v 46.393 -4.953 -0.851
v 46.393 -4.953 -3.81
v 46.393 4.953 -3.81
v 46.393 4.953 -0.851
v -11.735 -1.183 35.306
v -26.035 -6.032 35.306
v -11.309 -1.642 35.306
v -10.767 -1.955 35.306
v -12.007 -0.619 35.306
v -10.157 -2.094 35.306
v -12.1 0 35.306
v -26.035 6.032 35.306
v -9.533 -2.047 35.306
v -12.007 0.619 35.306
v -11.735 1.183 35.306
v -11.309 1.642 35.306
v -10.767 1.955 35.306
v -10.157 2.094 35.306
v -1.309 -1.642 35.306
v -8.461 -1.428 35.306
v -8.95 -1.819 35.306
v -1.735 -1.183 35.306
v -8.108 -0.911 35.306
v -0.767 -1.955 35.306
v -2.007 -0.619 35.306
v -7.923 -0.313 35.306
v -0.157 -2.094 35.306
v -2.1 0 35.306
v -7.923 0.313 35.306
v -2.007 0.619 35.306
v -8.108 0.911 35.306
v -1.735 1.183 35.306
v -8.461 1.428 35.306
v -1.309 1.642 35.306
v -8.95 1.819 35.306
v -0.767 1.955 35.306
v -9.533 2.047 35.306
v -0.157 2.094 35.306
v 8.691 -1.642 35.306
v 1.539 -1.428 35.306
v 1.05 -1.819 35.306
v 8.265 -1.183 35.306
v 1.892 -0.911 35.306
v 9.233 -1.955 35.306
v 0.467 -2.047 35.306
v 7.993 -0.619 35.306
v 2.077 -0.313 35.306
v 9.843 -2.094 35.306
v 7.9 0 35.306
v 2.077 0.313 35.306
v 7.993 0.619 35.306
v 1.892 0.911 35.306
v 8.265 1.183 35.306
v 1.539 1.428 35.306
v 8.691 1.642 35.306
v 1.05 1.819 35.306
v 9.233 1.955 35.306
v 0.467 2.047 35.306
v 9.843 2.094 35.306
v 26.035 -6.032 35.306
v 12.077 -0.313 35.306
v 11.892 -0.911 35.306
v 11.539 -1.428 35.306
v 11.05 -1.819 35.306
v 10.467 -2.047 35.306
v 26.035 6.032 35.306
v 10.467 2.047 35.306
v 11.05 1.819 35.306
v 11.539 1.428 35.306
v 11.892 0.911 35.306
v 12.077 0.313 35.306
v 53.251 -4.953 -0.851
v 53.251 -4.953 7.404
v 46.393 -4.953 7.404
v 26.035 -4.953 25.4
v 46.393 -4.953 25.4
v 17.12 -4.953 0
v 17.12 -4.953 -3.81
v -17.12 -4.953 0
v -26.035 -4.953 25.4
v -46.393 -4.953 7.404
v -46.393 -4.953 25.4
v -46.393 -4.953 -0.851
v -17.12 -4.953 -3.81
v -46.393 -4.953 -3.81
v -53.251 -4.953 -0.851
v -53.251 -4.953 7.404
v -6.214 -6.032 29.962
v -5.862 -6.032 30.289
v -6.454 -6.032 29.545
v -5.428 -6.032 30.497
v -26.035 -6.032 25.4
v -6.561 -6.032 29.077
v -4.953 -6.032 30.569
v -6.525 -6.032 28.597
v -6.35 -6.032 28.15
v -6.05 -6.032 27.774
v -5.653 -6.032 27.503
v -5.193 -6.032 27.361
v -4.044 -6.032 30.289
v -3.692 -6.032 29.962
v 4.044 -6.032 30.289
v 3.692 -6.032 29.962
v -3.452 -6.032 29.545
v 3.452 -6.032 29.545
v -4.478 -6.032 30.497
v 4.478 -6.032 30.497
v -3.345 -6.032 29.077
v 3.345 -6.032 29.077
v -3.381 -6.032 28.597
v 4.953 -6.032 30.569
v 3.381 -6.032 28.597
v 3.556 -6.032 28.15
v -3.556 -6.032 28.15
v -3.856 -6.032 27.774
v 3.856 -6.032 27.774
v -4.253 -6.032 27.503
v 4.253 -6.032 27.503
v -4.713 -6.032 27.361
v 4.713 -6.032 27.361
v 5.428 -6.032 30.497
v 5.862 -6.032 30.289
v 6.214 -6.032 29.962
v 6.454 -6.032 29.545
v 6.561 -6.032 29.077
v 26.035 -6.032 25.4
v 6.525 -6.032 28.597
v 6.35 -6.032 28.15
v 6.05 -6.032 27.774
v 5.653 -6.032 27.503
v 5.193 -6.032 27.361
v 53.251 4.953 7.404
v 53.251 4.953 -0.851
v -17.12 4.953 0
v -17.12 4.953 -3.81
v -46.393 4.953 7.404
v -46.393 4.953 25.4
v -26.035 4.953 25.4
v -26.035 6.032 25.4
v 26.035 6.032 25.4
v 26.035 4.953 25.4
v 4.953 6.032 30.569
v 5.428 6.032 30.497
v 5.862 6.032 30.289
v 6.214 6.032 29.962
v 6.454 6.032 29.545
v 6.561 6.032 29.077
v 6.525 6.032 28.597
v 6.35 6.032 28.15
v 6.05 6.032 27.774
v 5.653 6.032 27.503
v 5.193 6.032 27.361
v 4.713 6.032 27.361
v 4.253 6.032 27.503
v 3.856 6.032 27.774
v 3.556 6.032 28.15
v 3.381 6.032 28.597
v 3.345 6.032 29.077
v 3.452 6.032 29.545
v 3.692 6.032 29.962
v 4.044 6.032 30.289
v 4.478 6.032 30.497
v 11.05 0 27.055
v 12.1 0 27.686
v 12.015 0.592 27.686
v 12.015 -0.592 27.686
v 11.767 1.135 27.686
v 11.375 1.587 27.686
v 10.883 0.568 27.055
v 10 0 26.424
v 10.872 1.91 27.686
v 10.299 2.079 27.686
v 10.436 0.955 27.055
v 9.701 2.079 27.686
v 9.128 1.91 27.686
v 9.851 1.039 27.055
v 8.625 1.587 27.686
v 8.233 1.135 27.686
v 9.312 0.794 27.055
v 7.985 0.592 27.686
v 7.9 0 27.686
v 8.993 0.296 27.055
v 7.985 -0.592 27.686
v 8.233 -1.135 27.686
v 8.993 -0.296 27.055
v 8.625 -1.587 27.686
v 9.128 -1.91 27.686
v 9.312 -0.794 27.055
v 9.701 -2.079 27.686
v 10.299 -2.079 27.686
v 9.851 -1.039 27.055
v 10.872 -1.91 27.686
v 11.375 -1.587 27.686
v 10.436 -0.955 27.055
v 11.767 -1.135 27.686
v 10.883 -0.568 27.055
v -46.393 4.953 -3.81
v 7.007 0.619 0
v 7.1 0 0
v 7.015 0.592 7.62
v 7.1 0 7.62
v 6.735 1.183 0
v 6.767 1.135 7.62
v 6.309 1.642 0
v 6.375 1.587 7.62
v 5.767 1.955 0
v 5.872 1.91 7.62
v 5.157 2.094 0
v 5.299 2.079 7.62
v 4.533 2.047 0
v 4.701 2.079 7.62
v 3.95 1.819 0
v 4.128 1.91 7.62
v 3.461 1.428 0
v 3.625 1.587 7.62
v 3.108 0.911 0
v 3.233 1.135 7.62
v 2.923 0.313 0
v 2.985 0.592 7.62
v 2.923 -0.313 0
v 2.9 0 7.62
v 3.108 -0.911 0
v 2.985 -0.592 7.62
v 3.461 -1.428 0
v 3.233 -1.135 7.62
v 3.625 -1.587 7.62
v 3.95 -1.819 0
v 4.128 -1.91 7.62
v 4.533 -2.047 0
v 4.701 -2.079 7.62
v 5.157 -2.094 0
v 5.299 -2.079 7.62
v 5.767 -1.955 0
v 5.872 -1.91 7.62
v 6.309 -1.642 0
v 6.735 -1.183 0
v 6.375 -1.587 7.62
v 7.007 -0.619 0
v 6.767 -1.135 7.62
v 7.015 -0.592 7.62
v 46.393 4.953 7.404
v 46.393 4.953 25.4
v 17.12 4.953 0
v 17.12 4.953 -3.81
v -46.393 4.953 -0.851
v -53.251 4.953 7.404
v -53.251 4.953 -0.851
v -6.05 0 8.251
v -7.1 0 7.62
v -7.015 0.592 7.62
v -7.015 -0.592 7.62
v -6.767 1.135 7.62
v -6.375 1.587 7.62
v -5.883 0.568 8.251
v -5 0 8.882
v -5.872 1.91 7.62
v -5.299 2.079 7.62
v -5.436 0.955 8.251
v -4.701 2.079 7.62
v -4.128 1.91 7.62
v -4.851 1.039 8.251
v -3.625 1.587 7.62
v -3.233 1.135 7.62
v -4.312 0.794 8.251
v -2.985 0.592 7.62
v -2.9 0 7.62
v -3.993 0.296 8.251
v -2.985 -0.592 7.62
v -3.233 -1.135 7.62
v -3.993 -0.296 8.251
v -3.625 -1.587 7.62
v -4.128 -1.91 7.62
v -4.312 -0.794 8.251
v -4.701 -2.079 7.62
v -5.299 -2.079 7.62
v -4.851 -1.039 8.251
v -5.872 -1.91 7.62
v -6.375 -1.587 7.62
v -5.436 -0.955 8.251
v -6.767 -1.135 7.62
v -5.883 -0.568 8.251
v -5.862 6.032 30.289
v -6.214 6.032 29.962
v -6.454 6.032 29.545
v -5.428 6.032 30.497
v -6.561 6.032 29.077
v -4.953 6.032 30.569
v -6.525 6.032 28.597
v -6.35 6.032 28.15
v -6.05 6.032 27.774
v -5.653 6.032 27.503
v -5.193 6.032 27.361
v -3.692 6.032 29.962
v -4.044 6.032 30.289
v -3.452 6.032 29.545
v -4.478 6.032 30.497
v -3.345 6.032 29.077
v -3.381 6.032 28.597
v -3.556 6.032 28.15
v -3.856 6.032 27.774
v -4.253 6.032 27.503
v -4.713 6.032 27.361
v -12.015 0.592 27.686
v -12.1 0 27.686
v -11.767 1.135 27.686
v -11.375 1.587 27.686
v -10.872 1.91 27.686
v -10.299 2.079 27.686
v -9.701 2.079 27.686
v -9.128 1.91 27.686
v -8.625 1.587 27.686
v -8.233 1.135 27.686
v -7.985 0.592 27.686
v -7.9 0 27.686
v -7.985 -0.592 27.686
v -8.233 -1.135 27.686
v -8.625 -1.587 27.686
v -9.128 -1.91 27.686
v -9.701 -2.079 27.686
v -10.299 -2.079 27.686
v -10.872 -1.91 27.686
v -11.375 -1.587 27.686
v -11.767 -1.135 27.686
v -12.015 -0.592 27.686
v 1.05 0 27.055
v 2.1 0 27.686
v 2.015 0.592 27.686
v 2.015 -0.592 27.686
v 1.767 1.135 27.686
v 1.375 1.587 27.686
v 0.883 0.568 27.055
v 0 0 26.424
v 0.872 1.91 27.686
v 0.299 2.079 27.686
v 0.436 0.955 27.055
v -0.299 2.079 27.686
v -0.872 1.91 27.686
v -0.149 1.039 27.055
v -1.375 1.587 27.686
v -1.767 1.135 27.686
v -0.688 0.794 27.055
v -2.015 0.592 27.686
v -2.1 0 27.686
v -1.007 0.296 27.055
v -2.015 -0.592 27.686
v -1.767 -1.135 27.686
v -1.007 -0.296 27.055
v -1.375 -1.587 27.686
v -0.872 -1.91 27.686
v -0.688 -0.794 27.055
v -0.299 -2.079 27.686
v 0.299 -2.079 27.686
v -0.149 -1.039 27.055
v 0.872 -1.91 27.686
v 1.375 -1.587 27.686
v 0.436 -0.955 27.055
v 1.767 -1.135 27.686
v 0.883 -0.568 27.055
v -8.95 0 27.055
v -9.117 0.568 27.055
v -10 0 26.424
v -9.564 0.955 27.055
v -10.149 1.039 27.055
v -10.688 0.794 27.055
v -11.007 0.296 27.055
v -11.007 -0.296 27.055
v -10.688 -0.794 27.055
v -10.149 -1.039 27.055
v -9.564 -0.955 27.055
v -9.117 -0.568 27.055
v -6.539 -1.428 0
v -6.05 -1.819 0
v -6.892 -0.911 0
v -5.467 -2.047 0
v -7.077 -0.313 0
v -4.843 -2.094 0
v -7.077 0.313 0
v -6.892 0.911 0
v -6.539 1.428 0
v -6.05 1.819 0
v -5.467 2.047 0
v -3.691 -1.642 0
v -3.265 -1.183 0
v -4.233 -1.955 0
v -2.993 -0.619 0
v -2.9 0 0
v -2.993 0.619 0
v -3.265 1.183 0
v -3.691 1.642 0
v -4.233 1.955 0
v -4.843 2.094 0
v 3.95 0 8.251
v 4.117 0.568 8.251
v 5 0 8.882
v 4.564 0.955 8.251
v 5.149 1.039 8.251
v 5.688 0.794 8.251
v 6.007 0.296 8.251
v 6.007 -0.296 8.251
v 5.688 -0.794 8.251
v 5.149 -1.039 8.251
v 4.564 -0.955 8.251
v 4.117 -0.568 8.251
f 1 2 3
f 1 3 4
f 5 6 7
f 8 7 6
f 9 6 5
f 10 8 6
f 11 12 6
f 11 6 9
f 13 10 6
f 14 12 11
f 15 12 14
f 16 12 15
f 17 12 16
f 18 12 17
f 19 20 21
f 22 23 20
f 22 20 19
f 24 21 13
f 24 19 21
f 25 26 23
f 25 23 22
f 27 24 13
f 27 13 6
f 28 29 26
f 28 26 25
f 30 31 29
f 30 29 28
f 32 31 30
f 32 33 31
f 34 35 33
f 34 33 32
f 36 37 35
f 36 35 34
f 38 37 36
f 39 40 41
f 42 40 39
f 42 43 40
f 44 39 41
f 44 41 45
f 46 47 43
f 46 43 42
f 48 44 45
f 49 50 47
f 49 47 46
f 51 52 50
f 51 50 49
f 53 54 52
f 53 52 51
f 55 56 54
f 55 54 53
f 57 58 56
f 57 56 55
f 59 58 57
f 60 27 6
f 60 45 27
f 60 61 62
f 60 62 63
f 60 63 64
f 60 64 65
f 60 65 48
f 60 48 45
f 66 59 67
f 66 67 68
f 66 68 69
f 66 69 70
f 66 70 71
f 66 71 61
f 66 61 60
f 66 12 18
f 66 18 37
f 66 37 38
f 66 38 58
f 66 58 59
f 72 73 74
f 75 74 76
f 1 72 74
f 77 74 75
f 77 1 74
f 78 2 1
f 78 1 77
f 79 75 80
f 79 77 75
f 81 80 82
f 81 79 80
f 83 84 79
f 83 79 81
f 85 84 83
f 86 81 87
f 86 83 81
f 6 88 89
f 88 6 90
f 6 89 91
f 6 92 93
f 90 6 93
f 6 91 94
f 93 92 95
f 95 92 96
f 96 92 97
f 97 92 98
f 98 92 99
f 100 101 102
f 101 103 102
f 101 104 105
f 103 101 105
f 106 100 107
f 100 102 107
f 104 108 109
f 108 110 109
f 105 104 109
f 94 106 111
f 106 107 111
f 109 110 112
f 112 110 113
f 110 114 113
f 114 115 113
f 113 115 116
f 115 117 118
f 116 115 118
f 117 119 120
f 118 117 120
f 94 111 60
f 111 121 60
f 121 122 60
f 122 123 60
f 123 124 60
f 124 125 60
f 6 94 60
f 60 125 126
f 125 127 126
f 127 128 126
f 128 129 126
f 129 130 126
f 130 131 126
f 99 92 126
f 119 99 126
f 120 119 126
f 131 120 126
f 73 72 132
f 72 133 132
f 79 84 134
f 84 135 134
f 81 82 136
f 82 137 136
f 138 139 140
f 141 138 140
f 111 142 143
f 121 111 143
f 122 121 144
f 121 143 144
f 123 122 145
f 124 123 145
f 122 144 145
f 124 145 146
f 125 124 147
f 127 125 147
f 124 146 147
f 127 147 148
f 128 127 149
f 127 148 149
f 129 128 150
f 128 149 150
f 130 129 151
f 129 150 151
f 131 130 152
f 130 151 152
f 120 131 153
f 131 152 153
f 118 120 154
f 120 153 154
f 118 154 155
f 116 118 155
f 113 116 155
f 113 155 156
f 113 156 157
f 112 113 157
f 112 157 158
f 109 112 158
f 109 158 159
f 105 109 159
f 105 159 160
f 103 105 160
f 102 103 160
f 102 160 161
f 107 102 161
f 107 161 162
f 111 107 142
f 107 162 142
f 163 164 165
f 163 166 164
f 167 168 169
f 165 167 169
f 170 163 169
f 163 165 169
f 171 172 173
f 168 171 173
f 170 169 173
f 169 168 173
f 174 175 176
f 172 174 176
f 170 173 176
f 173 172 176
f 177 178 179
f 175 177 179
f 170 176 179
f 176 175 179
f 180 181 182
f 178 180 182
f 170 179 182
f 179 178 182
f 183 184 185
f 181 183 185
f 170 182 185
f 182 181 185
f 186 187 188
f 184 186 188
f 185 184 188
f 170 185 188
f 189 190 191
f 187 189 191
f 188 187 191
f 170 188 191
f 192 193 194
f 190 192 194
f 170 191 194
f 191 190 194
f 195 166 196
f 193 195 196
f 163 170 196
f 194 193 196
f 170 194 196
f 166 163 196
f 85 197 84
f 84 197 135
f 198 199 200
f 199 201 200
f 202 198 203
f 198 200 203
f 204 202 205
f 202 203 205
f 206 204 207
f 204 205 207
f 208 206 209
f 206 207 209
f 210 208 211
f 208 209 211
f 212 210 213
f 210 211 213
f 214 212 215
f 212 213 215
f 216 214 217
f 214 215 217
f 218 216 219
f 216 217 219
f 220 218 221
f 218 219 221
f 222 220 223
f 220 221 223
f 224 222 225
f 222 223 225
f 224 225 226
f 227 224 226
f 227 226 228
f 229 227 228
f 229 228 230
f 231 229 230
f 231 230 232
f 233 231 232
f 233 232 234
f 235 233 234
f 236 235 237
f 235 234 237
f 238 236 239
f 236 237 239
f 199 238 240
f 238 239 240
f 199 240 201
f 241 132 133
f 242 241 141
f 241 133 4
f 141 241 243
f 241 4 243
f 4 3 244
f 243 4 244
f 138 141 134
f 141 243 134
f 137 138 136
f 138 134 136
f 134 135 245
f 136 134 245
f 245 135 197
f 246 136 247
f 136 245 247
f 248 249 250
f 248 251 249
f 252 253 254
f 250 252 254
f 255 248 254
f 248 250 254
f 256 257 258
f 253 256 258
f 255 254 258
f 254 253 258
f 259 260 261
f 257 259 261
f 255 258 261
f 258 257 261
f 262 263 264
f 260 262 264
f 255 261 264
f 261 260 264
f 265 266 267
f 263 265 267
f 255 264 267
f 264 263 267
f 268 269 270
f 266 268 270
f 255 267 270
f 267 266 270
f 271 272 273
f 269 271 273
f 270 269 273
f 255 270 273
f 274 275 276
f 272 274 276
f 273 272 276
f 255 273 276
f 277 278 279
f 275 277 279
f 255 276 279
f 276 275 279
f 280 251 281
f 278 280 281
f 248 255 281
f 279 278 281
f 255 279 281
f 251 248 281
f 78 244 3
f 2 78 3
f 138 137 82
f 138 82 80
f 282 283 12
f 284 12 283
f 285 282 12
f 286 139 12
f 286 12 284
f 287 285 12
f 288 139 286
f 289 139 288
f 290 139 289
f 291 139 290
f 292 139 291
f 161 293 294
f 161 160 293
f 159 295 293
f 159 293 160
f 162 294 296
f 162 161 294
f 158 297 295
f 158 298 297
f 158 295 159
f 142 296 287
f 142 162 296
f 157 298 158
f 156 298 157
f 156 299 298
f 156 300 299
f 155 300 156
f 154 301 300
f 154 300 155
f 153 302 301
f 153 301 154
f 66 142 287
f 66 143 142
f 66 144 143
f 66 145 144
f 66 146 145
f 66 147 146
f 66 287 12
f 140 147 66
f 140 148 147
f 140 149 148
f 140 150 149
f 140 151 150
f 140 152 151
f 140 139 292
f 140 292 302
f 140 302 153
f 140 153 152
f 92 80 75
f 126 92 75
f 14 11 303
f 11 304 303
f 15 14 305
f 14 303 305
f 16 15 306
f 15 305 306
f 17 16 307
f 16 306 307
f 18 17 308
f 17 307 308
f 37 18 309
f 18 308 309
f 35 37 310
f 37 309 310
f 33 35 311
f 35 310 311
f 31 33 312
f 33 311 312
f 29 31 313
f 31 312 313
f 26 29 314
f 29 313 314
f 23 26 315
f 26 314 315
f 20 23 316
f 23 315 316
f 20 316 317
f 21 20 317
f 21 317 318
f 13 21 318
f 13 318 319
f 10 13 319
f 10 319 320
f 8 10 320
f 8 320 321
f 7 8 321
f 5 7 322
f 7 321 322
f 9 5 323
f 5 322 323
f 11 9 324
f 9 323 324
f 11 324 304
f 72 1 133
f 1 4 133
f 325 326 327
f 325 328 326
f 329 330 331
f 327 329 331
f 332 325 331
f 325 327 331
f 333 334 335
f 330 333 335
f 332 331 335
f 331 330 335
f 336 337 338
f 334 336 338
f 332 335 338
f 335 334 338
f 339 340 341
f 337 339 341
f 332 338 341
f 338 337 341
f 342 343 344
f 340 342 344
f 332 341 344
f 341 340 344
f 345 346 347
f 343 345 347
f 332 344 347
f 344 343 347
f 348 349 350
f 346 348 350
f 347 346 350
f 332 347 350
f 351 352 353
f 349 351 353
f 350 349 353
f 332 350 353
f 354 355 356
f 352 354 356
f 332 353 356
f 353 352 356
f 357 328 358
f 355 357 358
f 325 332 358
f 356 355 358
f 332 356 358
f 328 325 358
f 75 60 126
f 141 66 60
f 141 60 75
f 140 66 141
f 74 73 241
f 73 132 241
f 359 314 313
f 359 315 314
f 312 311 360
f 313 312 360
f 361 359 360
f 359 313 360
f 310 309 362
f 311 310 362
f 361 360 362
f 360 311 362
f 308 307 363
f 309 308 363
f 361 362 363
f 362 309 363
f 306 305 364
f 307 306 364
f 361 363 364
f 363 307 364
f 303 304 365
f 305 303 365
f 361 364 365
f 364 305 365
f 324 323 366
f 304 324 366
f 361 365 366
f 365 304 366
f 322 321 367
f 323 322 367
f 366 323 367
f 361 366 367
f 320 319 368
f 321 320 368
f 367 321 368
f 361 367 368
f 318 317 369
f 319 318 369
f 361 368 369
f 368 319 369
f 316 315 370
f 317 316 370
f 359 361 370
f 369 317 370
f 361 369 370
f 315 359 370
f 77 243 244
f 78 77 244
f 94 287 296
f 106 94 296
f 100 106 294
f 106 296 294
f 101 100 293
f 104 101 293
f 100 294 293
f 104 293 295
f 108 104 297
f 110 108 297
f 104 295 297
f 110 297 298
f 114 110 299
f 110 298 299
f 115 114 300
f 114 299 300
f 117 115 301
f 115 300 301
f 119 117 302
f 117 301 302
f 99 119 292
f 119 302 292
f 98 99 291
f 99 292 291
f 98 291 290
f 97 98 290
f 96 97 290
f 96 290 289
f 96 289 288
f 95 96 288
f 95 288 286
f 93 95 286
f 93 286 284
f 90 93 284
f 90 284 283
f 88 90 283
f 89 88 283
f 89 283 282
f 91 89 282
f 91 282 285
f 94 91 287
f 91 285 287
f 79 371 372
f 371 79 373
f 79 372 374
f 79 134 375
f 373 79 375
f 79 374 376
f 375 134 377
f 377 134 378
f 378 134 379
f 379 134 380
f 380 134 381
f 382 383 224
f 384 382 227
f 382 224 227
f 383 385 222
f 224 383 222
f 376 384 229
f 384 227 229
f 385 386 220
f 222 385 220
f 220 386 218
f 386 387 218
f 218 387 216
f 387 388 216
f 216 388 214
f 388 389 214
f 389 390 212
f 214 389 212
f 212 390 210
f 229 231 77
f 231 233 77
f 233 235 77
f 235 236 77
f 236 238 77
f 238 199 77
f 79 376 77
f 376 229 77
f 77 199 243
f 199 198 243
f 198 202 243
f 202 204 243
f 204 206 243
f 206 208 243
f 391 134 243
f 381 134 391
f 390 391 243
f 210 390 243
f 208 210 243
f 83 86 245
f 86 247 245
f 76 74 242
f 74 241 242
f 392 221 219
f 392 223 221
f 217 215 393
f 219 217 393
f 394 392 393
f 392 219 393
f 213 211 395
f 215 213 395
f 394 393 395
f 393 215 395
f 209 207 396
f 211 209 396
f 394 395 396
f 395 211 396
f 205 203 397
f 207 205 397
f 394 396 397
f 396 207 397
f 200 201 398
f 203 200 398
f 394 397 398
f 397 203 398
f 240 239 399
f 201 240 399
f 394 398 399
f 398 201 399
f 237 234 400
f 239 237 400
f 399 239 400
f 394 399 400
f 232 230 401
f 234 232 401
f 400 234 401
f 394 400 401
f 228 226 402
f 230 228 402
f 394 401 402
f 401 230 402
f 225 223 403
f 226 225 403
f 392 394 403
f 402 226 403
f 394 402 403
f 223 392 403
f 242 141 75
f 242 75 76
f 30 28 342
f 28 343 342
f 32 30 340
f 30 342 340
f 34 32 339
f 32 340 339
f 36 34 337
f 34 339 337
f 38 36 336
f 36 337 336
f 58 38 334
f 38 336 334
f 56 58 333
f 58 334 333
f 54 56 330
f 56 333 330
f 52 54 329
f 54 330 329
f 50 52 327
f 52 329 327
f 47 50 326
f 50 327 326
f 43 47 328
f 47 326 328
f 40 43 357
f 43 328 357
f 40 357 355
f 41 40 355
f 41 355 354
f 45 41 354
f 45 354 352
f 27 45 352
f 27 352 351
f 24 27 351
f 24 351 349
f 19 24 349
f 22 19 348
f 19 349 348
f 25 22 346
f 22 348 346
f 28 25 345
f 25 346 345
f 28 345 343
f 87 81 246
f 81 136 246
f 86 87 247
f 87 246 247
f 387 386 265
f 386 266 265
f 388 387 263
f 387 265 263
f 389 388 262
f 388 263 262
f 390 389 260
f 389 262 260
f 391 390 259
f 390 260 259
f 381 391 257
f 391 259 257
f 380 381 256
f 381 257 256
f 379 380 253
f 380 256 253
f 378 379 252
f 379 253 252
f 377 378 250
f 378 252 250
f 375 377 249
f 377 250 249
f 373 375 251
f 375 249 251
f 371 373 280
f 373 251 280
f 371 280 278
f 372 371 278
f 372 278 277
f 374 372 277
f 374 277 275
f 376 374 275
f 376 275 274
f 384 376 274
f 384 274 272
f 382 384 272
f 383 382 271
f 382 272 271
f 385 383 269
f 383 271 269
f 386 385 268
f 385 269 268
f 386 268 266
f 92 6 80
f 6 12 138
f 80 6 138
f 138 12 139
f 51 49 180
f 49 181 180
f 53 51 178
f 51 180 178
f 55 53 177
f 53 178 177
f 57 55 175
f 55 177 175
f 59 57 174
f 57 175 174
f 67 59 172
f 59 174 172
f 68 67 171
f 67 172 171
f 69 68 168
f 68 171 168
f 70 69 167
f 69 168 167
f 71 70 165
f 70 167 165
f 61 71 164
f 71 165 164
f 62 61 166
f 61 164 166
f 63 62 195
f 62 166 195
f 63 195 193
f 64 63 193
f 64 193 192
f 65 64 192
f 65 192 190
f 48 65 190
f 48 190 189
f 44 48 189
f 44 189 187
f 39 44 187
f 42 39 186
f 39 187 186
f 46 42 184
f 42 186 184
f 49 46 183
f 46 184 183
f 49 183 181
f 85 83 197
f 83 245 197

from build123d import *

# Parameters (mm, degrees)
BOSS_EXTRUDE1_DEPTH                 = 4.953
SKETCH4_W                           = 52.07
SKETCH4_H                           = 9.906
BOSS_EXTRUDE3_DEPTH                 = 6.0325
SKETCH5_R                           = 1.6129
CUT_EXTRUDE1_DEPTH                  = 12.065
M5X0_8_TAPPED_HOLE1_D               = 4.2
M5X0_8_TAPPED_HOLE1_DEPTH           = 7.62
M5X0_8_TAPPED_HOLE1_TIP             = 1.2618073
M5X0_8_TAPPED_HOLE1_ON_FACE_2_D     = 4.2
M5X0_8_TAPPED_HOLE1_ON_FACE_2_DEPTH = 7.62
M5X0_8_TAPPED_HOLE1_ON_FACE_2_TIP   = 1.2618073


with BuildPart() as part:
    # Sketch1 → Boss-Extrude1 (new, symmetric)
    with BuildSketch(Plane(origin=(0, 0, 0), x_dir=(1, 0, 0), z_dir=(0, 1, 0))):
        Polygon((17.1196, 3.81), (46.3931, 3.81), (46.3931, 0.8509), (53.2511, 0.8509), (53.2511, -7.4041), (46.3931, -7.4041), (46.3931, -25.4), (26.035, -25.4), (-26.035, -25.4), (-46.3931, -25.4), (-46.3931, -7.4041), (-53.2511, -7.4041), (-53.2511, 0.8509), (-46.3931, 0.8509), (-46.3931, 3.81), (-17.1196, 3.81), (-17.1196, 0), (17.1196, 0), align=None)
    extrude(amount=BOSS_EXTRUDE1_DEPTH, both=True)

    # Sketch4 → Boss-Extrude3 (add, symmetric)
    with BuildSketch(Plane(origin=(0, 0, 0), x_dir=(1, 0, 0), z_dir=(0, 1, 0))):
        with Locations((0, -30.353)):
            Rectangle(SKETCH4_W, SKETCH4_H)
    extrude(amount=BOSS_EXTRUDE3_DEPTH, both=True)

    # Sketch5 → Cut-Extrude1 (cut)
    with BuildSketch(Plane(origin=(0, 6.0325, 0), x_dir=(1, 0, 0), z_dir=(0, 1, 0))):
        with Locations(Location((-4.953, -28.956, 0), (0, 0, 270))):
            Circle(SKETCH5_R)
        with Locations(Location((4.953, -28.956, 0), (0, 0, 270))):
            Circle(SKETCH5_R)
    extrude(amount=-CUT_EXTRUDE1_DEPTH, mode=Mode.SUBTRACT)

    # M5x0.8 Tapped Hole1
    with Locations(Plane.XY.offset(35.306)):
        with Locations((0, 0), (-10, 0), (10, 0)):
            Hole(M5X0_8_TAPPED_HOLE1_D / 2, depth=M5X0_8_TAPPED_HOLE1_DEPTH)
            with Locations((0, 0, -(M5X0_8_TAPPED_HOLE1_DEPTH + M5X0_8_TAPPED_HOLE1_TIP / 2))):  # 118° drill point
                Cone(0, M5X0_8_TAPPED_HOLE1_D / 2, M5X0_8_TAPPED_HOLE1_TIP, mode=Mode.SUBTRACT)

    # M5x0.8 Tapped Hole1 on face 2
    with Locations(Plane(origin=(-5, 0, 0), x_dir=(-1, 0, 0), z_dir=(0, 0, -1))):
        with Locations((0, 0), (-10, 0)):
            Hole(M5X0_8_TAPPED_HOLE1_ON_FACE_2_D / 2, depth=M5X0_8_TAPPED_HOLE1_ON_FACE_2_DEPTH)
            with Locations((0, 0, -(M5X0_8_TAPPED_HOLE1_ON_FACE_2_DEPTH + M5X0_8_TAPPED_HOLE1_ON_FACE_2_TIP / 2))):  # 118° drill point
                Cone(0, M5X0_8_TAPPED_HOLE1_ON_FACE_2_D / 2, M5X0_8_TAPPED_HOLE1_ON_FACE_2_TIP, mode=Mode.SUBTRACT)


solid = part.part
